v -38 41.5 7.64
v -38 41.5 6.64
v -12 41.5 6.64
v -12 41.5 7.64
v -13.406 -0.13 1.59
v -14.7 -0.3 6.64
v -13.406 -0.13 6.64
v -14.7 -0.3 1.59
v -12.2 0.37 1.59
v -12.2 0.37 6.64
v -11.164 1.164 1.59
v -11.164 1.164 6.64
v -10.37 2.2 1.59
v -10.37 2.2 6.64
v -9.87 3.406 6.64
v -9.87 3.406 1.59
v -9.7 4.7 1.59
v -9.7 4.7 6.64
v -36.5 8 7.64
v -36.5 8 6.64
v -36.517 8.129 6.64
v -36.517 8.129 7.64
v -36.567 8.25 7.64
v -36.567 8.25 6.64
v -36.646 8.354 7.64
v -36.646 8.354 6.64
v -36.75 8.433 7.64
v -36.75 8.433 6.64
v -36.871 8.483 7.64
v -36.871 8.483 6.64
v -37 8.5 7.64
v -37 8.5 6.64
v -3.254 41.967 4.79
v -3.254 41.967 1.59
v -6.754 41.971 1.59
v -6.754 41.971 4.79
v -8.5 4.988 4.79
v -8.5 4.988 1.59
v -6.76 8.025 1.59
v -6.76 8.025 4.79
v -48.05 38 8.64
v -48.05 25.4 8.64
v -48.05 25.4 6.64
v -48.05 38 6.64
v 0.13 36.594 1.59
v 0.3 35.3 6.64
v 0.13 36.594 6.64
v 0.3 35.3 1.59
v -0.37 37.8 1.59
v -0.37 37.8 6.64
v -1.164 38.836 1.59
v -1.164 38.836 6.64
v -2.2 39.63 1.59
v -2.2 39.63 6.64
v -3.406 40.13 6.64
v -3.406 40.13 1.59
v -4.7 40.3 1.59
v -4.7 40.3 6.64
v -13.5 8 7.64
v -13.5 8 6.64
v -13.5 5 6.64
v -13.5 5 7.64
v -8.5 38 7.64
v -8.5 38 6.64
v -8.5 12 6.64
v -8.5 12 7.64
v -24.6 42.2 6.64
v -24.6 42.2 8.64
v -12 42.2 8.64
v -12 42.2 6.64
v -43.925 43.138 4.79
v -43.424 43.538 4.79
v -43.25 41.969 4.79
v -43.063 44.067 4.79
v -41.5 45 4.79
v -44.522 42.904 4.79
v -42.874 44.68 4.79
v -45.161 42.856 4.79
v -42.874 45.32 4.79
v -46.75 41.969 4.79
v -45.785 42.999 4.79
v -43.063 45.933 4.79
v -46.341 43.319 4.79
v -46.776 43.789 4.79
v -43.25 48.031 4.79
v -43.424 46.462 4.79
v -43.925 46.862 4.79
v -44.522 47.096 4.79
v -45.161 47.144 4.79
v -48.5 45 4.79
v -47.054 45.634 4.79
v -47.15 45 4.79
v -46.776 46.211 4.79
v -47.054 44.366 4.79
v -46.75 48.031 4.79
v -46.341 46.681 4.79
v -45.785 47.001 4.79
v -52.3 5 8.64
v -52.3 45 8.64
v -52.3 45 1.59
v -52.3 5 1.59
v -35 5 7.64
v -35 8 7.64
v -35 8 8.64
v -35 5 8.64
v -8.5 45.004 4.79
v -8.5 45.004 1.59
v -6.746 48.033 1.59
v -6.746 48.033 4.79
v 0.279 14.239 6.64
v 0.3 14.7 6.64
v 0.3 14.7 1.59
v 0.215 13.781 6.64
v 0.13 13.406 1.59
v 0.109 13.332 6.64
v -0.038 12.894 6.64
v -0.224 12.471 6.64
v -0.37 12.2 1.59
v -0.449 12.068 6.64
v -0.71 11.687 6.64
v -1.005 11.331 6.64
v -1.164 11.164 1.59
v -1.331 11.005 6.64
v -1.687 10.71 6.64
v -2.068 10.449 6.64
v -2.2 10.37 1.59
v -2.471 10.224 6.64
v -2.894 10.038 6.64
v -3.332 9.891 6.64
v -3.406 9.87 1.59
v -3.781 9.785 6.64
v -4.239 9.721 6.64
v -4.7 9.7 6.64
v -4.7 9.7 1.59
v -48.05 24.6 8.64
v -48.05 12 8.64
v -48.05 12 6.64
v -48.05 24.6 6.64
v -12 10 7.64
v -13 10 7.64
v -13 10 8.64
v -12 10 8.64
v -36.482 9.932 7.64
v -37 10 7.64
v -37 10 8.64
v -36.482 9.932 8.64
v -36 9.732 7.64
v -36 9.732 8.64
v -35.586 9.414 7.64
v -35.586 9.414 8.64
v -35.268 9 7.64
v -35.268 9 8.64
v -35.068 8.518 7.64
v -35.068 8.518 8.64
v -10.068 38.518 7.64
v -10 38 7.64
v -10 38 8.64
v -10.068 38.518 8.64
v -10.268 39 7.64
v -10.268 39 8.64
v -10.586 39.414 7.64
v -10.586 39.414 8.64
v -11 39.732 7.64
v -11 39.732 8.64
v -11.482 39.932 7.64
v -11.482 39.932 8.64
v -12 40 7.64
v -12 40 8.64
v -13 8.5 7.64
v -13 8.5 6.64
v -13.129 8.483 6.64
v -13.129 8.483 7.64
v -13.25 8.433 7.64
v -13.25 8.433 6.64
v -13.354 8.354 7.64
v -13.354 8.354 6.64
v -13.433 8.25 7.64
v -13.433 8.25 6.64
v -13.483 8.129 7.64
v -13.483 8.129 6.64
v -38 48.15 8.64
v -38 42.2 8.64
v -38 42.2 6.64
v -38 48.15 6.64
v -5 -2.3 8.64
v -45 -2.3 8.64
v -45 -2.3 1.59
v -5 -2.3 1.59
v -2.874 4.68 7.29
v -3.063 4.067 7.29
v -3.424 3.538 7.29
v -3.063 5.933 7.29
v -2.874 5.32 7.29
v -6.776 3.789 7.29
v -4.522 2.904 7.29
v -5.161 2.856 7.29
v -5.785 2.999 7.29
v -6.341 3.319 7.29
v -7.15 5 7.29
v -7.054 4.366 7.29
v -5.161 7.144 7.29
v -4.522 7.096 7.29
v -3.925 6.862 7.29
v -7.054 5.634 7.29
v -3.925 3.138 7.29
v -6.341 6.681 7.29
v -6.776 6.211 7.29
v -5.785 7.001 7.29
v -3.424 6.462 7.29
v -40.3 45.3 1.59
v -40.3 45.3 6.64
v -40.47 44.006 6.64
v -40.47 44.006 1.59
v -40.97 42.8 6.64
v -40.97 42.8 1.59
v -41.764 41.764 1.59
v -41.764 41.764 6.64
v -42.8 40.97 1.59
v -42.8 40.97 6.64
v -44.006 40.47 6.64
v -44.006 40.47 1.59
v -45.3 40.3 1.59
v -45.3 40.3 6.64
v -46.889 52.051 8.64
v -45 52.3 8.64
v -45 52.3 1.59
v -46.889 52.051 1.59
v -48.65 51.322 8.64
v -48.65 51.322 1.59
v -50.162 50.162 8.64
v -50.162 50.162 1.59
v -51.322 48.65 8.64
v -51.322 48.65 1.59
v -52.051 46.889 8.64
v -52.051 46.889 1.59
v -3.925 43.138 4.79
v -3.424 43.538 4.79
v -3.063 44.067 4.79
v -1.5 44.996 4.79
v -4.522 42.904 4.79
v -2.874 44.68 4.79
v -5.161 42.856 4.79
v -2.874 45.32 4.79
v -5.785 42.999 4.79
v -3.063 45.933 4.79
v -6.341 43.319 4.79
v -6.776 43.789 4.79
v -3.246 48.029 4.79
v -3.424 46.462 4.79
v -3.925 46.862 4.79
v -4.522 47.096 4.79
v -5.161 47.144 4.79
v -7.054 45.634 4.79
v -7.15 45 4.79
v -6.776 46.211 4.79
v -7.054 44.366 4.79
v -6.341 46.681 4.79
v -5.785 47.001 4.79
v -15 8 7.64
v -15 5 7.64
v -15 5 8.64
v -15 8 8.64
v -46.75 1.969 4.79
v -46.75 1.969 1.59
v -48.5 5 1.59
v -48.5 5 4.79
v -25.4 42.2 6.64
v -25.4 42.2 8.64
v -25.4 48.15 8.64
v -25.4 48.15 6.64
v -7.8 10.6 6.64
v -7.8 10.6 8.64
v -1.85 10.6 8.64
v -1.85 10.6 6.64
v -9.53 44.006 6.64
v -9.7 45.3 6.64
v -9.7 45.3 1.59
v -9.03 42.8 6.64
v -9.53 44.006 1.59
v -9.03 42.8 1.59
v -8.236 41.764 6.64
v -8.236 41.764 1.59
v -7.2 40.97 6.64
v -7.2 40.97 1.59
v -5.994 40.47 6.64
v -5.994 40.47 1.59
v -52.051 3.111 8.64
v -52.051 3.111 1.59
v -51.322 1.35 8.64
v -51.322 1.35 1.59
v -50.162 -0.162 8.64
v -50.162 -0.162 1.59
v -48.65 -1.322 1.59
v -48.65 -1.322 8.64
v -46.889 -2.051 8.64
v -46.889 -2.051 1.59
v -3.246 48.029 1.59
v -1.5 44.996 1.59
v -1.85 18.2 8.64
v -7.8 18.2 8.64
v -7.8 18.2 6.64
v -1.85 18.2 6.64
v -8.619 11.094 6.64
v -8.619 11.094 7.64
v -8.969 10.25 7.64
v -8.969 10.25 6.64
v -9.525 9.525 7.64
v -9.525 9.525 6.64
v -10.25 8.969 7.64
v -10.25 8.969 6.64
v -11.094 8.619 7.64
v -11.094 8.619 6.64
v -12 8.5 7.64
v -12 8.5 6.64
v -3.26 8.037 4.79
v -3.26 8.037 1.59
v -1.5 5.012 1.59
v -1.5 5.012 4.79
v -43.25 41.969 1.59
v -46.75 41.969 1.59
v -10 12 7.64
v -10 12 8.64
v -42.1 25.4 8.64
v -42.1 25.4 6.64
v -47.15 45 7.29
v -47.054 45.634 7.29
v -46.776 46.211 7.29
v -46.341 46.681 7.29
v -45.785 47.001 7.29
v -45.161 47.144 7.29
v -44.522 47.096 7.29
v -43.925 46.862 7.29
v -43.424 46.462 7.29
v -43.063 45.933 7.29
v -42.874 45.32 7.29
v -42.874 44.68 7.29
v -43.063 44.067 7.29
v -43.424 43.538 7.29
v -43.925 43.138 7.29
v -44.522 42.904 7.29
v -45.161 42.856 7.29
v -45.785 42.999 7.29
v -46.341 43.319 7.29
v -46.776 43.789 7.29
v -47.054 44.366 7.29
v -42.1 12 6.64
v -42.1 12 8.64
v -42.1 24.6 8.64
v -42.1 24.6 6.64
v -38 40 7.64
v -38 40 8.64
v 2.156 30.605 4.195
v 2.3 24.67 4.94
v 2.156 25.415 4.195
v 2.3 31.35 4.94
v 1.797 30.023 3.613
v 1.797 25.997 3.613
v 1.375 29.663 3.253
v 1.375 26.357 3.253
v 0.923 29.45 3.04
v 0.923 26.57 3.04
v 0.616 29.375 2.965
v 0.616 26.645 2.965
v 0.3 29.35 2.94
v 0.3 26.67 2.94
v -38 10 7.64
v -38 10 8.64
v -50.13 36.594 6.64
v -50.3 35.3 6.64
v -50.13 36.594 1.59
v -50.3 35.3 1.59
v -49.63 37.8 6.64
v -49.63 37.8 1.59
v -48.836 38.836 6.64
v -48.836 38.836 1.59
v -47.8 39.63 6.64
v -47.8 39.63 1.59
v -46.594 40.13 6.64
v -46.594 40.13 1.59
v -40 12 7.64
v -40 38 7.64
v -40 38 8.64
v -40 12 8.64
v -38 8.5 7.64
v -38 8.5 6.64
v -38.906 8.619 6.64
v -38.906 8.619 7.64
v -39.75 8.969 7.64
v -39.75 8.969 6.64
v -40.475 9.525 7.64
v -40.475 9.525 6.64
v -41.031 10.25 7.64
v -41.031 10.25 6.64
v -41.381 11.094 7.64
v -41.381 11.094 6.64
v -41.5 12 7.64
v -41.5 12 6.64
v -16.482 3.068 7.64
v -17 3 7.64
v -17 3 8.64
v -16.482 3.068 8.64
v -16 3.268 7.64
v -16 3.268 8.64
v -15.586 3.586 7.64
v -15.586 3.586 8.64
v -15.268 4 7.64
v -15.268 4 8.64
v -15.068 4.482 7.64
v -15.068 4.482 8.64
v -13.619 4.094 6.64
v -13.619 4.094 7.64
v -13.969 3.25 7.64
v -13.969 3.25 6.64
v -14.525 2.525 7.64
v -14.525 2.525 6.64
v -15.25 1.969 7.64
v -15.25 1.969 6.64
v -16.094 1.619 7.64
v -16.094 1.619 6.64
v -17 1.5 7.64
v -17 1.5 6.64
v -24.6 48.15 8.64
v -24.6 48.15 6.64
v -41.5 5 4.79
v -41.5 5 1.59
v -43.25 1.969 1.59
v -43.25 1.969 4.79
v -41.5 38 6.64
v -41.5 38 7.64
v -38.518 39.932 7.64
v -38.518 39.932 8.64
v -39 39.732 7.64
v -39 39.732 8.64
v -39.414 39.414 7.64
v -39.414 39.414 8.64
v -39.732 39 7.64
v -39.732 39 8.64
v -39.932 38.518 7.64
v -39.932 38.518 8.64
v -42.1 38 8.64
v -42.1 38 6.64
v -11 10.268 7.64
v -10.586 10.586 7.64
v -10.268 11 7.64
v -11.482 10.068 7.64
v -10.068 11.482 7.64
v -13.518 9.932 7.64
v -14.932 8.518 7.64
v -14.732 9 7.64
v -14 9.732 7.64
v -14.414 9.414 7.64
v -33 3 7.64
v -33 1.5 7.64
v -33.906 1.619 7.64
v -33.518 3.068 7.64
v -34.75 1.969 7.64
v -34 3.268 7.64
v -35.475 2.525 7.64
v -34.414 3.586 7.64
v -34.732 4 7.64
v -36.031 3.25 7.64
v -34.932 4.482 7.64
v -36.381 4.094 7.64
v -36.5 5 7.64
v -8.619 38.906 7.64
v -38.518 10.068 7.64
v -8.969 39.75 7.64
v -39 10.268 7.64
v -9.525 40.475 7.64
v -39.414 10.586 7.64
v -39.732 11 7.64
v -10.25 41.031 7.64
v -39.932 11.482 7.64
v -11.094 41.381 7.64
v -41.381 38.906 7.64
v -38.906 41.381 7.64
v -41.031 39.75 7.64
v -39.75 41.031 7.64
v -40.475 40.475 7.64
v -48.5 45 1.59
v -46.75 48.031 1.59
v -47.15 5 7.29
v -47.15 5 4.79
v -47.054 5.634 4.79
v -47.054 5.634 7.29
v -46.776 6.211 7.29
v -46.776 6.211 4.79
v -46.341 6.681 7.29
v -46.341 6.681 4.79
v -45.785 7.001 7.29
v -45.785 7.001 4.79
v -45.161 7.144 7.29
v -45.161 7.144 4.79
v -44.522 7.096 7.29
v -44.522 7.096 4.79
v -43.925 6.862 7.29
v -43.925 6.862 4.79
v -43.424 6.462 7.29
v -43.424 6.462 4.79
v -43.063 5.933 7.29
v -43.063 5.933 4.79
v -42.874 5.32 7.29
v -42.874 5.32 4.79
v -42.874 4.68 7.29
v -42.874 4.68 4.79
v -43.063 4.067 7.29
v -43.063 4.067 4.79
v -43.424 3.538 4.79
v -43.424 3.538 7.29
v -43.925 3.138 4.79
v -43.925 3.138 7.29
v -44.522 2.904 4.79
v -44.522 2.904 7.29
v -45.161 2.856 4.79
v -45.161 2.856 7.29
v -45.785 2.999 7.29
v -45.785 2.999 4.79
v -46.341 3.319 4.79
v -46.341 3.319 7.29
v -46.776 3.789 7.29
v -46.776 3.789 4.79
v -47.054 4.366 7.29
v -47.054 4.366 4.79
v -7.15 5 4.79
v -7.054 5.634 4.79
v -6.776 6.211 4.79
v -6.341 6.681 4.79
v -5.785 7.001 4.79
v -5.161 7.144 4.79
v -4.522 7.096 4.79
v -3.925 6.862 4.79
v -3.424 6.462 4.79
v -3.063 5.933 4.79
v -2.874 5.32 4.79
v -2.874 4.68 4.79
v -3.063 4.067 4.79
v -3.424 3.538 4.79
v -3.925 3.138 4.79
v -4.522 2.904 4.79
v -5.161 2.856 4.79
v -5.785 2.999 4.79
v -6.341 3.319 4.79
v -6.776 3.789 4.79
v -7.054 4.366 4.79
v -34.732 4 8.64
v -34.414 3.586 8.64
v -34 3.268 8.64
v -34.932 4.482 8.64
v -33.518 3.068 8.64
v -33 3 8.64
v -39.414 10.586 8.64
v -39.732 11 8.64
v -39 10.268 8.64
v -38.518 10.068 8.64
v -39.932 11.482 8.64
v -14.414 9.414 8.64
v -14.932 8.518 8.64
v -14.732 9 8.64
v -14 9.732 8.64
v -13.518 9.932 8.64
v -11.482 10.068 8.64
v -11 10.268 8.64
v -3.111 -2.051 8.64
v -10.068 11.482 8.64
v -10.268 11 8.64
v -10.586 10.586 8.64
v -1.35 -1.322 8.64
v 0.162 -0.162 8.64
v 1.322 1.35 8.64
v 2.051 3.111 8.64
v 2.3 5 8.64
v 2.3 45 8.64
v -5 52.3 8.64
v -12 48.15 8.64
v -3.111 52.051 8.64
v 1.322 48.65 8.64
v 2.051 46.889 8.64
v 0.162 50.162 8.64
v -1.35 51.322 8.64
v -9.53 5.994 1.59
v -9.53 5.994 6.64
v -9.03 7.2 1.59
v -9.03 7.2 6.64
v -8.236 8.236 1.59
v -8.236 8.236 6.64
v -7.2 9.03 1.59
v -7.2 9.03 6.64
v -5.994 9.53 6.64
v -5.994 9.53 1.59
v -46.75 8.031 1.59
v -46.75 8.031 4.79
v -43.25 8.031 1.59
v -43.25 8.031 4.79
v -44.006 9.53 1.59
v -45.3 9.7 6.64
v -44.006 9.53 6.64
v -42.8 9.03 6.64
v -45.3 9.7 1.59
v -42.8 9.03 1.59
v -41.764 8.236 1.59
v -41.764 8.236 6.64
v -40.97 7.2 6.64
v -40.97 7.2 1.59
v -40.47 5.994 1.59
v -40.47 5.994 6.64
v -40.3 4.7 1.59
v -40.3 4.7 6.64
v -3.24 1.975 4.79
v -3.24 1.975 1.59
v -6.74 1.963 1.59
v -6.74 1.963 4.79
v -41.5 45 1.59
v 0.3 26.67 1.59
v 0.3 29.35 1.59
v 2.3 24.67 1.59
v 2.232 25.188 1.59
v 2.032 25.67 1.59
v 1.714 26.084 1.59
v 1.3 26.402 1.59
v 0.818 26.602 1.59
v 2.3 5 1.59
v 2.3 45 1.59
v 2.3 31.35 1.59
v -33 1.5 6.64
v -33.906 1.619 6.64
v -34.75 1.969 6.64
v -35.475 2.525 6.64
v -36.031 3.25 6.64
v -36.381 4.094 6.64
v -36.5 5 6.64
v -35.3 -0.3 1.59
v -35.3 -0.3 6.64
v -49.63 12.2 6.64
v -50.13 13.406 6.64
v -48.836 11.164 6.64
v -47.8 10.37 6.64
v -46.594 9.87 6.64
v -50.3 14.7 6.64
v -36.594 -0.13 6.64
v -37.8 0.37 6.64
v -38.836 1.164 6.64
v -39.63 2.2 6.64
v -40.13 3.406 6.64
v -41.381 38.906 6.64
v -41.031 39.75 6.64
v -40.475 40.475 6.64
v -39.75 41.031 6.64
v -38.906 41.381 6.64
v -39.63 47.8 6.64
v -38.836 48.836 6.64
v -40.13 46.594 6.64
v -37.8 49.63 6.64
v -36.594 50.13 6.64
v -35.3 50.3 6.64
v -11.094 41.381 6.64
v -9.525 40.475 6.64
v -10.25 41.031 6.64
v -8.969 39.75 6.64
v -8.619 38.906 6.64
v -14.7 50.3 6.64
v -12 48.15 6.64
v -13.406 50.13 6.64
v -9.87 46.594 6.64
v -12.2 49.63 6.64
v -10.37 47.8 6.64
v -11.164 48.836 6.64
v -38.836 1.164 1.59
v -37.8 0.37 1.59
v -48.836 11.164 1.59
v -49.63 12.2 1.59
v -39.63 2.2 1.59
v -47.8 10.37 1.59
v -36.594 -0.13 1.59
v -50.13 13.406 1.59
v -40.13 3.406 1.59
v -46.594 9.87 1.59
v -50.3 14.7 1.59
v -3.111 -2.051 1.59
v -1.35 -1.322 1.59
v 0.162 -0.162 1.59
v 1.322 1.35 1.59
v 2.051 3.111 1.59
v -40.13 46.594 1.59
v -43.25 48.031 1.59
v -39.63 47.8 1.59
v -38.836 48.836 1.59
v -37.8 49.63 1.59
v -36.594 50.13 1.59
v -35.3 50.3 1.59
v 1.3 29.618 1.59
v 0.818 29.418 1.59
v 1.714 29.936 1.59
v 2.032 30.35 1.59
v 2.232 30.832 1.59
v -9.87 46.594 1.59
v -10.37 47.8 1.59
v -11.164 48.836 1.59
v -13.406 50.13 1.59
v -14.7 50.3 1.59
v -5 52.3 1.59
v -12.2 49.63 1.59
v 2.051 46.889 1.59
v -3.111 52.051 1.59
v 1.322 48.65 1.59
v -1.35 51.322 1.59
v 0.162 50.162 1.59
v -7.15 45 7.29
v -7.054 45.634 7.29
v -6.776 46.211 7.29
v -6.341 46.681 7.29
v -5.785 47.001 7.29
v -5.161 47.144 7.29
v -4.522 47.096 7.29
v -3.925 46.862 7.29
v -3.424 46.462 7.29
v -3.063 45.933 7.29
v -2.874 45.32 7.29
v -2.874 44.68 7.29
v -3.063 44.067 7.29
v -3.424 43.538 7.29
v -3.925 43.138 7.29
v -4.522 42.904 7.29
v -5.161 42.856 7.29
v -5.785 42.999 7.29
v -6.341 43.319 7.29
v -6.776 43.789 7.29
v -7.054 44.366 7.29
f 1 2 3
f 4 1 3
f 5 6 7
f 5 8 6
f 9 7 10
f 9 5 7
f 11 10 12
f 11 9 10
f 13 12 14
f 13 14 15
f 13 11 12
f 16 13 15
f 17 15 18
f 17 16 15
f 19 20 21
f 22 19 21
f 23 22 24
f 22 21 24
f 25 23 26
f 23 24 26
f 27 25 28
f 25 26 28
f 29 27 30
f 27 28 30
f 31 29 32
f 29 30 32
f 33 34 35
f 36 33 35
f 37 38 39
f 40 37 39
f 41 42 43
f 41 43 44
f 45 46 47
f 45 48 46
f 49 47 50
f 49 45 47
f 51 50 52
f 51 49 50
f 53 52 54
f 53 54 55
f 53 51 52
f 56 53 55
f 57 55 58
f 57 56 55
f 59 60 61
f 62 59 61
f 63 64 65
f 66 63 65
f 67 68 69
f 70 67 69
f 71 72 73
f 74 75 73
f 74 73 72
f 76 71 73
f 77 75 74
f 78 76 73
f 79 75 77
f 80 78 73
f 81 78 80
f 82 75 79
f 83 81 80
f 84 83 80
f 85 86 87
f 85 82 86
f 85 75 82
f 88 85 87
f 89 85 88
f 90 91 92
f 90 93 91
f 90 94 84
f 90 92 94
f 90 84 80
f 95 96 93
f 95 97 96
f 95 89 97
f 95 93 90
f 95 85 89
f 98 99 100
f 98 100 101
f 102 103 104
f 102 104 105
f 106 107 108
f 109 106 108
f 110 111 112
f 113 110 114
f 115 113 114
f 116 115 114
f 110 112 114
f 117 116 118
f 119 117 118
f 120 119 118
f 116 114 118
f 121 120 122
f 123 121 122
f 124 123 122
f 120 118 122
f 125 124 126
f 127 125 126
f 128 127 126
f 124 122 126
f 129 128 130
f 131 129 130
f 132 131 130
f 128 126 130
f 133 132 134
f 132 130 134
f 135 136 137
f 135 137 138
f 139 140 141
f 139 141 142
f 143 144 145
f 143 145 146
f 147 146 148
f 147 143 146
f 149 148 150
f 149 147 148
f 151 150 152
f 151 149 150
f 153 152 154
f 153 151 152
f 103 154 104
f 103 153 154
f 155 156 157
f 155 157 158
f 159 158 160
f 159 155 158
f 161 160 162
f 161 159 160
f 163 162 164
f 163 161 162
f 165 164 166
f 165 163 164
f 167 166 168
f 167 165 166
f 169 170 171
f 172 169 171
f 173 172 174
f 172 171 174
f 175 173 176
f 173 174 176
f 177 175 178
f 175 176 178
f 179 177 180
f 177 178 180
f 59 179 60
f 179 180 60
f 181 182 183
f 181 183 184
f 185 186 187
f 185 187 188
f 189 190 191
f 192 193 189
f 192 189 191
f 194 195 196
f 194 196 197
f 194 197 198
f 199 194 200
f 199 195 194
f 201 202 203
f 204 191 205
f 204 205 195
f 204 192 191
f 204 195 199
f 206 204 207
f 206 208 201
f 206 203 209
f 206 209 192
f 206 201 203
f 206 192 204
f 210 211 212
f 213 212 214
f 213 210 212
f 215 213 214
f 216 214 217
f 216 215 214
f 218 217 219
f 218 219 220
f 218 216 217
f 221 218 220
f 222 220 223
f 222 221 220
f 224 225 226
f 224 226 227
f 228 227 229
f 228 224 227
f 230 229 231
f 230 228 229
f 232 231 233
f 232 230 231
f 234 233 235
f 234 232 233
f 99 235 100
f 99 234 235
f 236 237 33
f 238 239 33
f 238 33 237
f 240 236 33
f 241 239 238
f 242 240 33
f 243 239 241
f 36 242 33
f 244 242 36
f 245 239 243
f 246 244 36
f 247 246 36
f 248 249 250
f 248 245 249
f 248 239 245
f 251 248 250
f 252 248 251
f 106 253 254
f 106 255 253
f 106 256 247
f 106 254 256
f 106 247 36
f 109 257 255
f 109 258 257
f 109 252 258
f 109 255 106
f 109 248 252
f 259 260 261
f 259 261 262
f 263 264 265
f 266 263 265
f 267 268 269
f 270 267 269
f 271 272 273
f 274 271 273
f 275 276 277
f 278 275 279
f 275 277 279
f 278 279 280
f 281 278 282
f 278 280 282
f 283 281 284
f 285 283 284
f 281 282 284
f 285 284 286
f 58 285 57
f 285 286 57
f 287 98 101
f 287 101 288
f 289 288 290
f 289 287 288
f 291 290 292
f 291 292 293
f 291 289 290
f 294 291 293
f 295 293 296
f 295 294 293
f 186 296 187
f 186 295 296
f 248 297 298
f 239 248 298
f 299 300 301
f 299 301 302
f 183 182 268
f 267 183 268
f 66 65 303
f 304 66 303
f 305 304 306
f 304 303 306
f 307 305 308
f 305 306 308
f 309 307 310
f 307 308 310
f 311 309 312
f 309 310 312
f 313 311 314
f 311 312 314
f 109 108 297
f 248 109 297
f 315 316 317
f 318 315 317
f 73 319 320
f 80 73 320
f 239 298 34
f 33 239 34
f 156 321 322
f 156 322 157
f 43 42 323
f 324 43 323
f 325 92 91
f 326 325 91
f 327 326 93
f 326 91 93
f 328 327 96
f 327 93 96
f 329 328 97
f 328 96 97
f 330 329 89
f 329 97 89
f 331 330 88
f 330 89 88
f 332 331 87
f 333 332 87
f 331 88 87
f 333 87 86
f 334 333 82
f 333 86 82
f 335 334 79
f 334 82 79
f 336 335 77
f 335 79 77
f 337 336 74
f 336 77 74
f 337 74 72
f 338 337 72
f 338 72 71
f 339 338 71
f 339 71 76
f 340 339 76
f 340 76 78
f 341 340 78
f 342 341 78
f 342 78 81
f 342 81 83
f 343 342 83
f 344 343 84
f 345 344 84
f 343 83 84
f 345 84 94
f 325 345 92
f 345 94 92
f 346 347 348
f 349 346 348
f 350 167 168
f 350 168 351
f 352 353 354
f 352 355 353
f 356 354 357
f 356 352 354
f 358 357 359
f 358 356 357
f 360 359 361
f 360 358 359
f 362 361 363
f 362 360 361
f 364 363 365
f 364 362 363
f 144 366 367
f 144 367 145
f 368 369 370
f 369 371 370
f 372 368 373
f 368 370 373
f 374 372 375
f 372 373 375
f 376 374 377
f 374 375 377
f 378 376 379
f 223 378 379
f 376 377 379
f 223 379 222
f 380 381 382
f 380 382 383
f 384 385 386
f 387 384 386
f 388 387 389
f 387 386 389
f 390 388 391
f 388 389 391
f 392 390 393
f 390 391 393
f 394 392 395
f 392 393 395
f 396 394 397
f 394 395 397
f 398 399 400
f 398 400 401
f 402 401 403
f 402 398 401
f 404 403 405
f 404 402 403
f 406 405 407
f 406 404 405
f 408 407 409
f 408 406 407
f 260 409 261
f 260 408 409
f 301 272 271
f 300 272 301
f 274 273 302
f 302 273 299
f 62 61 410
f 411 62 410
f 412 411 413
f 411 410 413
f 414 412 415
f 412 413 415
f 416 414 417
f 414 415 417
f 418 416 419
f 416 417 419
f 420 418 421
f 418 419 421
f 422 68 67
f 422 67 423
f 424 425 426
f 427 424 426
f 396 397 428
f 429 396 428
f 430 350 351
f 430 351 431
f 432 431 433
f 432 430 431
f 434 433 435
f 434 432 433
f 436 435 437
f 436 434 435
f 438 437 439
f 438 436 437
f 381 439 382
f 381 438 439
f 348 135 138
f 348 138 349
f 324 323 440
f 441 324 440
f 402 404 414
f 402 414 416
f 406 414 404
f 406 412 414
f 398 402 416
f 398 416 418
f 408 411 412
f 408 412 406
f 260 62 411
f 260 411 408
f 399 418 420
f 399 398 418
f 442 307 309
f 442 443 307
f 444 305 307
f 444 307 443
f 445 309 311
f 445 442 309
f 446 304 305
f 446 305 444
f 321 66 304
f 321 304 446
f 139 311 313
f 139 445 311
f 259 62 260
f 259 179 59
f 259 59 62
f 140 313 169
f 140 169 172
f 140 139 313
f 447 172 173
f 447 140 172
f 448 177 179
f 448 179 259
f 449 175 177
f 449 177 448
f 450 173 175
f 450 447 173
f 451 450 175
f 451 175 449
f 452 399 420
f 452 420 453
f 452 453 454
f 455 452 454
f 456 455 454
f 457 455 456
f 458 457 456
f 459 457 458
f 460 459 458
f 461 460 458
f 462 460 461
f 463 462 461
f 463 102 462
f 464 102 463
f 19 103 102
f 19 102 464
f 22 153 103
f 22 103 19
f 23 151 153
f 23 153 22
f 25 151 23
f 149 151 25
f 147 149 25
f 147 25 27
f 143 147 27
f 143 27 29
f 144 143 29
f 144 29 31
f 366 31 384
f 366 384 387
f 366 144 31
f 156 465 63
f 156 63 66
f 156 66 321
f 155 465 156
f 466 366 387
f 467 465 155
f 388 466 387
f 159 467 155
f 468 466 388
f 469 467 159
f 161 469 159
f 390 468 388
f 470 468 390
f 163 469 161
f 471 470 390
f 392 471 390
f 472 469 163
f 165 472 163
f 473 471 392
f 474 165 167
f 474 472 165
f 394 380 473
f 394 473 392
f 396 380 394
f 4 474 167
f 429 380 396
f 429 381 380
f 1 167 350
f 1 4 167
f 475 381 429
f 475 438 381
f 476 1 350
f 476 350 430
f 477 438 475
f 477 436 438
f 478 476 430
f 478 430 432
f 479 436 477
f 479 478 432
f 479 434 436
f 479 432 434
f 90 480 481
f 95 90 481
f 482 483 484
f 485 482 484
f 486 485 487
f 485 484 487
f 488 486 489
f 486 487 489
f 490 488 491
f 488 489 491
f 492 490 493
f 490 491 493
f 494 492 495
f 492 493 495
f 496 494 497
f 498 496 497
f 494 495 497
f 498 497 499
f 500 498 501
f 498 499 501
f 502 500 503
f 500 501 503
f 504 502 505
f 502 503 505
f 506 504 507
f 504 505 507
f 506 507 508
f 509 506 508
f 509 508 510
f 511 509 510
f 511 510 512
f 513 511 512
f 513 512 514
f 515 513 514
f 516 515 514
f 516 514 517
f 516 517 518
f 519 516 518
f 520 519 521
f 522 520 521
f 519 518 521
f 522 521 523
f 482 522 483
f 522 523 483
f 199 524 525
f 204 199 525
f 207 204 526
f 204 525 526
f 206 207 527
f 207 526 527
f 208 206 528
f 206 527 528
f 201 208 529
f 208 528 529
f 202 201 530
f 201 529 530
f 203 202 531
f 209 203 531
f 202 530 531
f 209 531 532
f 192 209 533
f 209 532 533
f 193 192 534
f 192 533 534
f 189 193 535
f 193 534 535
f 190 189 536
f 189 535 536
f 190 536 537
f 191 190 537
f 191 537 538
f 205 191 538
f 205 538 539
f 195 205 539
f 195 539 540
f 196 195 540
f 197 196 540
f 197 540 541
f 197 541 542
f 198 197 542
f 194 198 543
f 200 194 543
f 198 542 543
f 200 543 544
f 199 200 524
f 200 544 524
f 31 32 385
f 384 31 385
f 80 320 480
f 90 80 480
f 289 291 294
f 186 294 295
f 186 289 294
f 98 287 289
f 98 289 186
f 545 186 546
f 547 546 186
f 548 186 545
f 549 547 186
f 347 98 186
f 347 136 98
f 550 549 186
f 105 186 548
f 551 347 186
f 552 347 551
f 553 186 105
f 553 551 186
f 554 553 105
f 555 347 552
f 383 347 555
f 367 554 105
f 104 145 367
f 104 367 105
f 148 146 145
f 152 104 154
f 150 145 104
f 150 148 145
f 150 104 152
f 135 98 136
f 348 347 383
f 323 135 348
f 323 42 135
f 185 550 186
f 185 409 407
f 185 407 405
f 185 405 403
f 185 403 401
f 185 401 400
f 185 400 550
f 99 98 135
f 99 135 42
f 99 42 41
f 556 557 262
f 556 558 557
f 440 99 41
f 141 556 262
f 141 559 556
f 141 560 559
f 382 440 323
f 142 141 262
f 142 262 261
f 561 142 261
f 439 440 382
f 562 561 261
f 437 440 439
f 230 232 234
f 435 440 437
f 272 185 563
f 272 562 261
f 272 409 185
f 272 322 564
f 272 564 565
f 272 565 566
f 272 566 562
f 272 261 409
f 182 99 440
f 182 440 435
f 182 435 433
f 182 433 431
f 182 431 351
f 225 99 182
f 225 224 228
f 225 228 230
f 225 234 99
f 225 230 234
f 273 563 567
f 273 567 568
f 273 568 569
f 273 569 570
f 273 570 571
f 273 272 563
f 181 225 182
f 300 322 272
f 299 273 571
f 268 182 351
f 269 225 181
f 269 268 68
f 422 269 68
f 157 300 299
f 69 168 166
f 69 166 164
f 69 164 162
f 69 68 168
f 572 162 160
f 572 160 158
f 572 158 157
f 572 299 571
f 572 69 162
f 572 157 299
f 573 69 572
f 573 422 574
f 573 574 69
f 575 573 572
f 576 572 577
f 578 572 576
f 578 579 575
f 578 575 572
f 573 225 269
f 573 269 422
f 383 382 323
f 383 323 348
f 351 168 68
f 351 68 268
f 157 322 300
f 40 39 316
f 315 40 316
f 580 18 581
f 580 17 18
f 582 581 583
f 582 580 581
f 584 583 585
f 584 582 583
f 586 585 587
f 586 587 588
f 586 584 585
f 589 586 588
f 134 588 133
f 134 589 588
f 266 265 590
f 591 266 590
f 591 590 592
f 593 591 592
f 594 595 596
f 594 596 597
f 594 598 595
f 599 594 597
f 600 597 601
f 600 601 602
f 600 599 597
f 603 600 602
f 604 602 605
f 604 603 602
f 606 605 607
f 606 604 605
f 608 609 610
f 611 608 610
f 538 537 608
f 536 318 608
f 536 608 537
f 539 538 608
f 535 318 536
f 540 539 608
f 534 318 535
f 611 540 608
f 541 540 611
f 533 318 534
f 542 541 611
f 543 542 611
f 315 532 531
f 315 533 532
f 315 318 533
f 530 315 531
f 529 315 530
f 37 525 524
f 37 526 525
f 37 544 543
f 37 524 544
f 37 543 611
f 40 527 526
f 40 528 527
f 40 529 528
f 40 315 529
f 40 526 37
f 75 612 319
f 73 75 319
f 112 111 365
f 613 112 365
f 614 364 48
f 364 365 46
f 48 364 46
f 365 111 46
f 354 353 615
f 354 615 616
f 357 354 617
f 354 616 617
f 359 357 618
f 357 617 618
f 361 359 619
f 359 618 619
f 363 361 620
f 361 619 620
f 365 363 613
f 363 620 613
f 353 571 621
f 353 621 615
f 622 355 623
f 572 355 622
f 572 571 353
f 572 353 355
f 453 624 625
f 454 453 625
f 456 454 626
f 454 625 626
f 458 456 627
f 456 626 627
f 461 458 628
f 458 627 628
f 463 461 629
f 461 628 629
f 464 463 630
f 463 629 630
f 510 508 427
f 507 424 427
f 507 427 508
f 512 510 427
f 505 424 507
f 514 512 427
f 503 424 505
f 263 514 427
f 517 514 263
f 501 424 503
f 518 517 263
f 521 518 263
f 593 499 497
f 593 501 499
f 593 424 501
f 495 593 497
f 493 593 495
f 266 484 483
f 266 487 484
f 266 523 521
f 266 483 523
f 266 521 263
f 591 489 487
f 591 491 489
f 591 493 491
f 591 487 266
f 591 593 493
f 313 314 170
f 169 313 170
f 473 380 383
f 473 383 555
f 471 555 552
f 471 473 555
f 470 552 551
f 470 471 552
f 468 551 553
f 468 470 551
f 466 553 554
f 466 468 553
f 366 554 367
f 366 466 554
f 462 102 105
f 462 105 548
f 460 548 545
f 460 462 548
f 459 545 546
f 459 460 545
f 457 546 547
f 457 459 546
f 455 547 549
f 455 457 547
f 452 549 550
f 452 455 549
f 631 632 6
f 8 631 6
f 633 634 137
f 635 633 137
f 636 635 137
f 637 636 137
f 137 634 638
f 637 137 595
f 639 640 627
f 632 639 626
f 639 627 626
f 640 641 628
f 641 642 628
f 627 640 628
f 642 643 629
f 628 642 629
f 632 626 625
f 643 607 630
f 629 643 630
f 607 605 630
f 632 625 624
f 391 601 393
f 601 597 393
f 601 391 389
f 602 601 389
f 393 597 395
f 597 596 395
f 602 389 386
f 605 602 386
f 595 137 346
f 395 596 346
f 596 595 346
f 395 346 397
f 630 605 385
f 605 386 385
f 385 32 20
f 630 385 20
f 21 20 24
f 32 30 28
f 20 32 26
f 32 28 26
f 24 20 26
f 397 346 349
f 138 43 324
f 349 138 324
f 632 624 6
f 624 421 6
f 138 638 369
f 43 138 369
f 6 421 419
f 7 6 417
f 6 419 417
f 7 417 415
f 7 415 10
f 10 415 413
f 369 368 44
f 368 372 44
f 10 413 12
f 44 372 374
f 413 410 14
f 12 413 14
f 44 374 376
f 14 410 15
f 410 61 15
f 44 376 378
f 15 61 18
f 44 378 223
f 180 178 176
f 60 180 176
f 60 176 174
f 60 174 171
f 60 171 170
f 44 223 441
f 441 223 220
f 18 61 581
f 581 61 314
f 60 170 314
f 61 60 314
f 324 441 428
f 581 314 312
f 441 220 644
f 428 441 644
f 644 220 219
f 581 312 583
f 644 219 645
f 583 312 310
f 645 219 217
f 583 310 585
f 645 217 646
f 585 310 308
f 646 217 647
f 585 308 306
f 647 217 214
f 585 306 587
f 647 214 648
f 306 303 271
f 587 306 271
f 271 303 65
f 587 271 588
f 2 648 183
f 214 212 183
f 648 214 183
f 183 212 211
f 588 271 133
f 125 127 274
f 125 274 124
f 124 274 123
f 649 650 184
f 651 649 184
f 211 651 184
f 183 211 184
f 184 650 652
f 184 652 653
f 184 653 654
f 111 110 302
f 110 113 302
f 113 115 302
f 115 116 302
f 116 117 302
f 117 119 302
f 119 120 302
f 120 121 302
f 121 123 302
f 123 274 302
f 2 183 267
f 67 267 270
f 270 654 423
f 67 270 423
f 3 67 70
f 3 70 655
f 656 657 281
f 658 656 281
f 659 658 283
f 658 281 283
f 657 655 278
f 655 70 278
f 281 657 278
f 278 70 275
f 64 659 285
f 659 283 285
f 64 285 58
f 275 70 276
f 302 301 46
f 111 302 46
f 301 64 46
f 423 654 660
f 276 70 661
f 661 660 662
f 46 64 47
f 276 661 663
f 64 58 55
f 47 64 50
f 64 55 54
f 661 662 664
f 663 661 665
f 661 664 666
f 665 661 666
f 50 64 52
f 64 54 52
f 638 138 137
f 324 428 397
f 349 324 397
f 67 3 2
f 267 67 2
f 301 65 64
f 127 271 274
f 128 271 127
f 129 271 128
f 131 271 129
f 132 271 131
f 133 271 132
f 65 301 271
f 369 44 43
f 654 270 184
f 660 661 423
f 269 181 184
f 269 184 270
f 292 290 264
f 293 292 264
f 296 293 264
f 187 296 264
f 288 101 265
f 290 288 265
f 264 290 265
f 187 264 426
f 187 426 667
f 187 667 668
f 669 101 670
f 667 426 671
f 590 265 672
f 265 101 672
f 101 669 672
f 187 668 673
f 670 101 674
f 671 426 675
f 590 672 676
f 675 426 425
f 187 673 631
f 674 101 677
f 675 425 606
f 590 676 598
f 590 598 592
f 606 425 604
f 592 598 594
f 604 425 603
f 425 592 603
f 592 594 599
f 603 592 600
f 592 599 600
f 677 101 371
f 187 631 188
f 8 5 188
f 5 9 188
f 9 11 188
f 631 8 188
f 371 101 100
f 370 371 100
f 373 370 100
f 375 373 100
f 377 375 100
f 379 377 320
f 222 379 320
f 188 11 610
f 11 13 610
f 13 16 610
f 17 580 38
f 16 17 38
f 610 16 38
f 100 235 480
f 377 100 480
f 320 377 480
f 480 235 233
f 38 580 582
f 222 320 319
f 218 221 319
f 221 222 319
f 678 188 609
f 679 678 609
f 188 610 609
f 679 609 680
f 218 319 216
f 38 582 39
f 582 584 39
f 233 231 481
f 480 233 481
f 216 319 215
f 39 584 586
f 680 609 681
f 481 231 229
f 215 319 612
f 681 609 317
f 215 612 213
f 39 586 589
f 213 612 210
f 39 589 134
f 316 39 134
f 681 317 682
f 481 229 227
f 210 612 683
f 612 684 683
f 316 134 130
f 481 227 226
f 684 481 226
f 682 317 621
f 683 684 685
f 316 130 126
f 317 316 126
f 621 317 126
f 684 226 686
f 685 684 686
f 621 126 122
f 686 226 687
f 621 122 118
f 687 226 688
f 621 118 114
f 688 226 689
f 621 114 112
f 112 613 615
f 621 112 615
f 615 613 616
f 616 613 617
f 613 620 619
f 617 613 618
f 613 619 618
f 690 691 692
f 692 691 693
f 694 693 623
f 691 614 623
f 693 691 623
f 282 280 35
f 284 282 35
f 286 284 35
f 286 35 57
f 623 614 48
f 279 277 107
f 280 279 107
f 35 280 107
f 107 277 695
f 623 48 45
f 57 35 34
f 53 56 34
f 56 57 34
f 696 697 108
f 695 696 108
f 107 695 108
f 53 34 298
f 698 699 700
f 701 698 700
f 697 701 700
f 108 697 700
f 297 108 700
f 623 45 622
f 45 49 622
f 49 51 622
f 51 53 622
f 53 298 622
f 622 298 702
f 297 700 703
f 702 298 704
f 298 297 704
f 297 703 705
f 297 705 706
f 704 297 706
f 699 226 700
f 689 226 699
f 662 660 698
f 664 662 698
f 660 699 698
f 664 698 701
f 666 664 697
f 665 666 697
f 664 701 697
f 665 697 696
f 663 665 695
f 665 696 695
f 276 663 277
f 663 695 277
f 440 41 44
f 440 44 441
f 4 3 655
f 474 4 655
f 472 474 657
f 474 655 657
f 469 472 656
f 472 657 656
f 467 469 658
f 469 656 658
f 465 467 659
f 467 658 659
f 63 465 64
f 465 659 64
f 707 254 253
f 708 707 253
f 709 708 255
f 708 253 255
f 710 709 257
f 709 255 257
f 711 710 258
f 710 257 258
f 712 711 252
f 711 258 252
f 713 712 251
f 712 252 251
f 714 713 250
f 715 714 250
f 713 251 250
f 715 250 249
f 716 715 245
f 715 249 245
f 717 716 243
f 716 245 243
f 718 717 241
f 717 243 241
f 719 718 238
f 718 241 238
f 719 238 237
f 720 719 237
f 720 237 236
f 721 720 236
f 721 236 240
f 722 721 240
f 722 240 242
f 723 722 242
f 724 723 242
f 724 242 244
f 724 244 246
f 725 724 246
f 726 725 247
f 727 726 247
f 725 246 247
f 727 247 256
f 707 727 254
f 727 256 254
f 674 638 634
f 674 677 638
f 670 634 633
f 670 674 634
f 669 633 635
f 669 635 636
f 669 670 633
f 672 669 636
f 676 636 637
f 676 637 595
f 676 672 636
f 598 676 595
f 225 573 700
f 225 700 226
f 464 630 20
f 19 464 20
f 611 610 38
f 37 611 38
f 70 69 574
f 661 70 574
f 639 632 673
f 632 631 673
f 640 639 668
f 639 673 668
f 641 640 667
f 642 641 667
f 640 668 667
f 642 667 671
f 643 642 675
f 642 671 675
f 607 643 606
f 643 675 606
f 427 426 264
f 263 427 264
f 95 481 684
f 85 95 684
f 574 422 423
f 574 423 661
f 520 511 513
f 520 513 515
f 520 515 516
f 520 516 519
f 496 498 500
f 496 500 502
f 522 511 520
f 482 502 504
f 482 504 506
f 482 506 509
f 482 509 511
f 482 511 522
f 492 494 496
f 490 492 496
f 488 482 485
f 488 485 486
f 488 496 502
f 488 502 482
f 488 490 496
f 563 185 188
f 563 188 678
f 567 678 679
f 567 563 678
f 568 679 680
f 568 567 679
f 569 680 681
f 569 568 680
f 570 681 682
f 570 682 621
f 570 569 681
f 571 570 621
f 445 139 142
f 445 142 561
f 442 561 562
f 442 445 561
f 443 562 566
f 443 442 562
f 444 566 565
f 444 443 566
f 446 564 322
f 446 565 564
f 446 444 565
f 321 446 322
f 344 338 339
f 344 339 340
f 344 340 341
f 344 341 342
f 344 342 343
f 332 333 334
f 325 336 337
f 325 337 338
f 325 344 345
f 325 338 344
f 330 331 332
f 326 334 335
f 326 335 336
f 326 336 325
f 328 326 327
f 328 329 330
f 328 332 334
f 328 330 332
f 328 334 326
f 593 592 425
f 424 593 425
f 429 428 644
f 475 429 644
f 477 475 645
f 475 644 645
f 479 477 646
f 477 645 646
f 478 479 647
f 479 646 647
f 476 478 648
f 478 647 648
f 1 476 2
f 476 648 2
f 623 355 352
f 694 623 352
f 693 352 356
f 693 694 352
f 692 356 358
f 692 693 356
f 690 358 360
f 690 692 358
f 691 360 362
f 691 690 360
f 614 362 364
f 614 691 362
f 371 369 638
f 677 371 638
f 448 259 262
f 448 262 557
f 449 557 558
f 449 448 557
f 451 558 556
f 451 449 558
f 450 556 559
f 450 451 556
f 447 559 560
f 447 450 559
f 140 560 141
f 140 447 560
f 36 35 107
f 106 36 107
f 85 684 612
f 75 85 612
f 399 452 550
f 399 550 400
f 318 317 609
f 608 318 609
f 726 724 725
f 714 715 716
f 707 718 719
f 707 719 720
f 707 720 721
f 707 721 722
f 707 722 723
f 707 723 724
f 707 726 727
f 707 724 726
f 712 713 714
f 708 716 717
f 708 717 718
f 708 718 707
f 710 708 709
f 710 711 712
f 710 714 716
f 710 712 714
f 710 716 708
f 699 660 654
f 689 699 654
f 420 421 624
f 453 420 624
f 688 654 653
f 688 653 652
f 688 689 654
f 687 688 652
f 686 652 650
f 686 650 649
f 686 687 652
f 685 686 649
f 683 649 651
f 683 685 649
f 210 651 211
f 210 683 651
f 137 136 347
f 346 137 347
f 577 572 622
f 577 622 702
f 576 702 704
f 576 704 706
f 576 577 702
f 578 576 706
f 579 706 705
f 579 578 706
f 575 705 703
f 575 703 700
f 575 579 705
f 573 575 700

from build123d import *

# Parameters (mm, degrees)
WALL_EXTRUDE_BOSS_START          = 8.64
WALL_EXTRUDE_BOSS_DEPTH          = 7.05
CEILING_EXTRUDE_BOSS_DEPTH       = 2
SCREWS_BLOCKS_EXTRUDE_BOSS_DEPTH = 5.05
SCREWS_BLOCKS_FILLET_R           = 5
NUTS_EXTRUDE_DEPTH               = 3.2
SCREWS_SKETCH_R                  = 2.15
SCREWS_HOOLES_EXTRUDE_DEPTH      = 2.5
CONNECTORS_SKETCH_W              = 12.6
CONNECTORS_SKETCH_H              = 5.95
CONNECTORS_SKETCH_W_2            = 5.95
CONNECTORS_SKETCH_H_2            = 12.6
CONNECTORS_SKETCH_H_3            = 7.6
CONNECTORS_EXTRUDE_DEPTH         = 2.5
SWITCH_SKETCH_W                  = 1.4
SWITCH_SKETCH_H                  = 2.68
SWITCH_EXTRUDE_DEPTH             = 2.5
SWITCH_FILLET_R                  = 2
GLASS_EXTRUDE_DEPTH              = 2.5
GLASS_FIT_EXTRUDE_DEPTH          = 1


with BuildPart() as part:
    # Wall_Sketch → Wall_Extrude_Boss (new body)
    with BuildSketch(Plane.XY.offset(WALL_EXTRUDE_BOSS_START)):
        with BuildLine():
            Line((-52.3, 44.999999897), (-52.29999, 5.00000605))
            ThreePointArc((-52.29999, 5.00000605), (-50.161874571, -0.161870293), (-45, -2.29999))
            Line((-45, -2.29999), (-5.000000575, -2.3))
            ThreePointArc((-5.000000575, -2.3), (0.161879299, -0.161879706), (2.3, 5))
            Line((2.3, 5), (2.3, 45))
            ThreePointArc((2.3, 45), (0.161879503, 50.161879503), (-5, 52.3))
            Line((-5, 52.3), (-45, 52.3))
            ThreePointArc((-45, 52.3), (-50.161879539, 50.161879466), (-52.3, 44.999999897))
        make_face()
        with BuildLine():
            Line((-5, 50.3), (-45, 50.3))
            ThreePointArc((-45, 50.3), (-48.747665967, 48.747665914), (-50.3, 44.999999925))
            Line((-50.3, 44.999999925), (-50.29999, 5.00000655))
            ThreePointArc((-50.29999, 5.00000655), (-48.747661185, 1.252343447), (-45, -0.29999))
            Line((-45, -0.29999), (-5.000000075, -0.3))
            ThreePointArc((-5.000000075, -0.3), (-1.252334086, 1.252334033), (0.3, 5))
            Line((0.3, 5), (0.3, 45))
            ThreePointArc((0.3, 45), (-1.25233406, 48.74766594), (-5, 50.3))
        make_face(mode=Mode.SUBTRACT)
    extrude(amount=-WALL_EXTRUDE_BOSS_DEPTH)

    # Ceiling_Sketch → Ceiling_Extrude_Boss (add)
    with BuildSketch(Plane.XY.offset(8.64)):
        with BuildLine():
            Line((-45, -0.29999), (-5.000000075, -0.3))
            ThreePointArc((-5.000000075, -0.3), (-1.252334086, 1.252334033), (0.3, 5))
            Line((0.3, 5), (0.3, 45))
            ThreePointArc((0.3, 45), (-1.25233406, 48.74766594), (-5, 50.3))
            Line((-5, 50.3), (-45, 50.3))
            ThreePointArc((-45, 50.3), (-48.747665967, 48.747665914), (-50.3, 44.999999925))
            Line((-50.3, 44.999999925), (-50.29999, 5.00000655))
            ThreePointArc((-50.29999, 5.00000655), (-48.747661185, 1.252343447), (-45, -0.29999))
        make_face()
    extrude(amount=-CEILING_EXTRUDE_BOSS_DEPTH)


with BuildPart() as screws_blocks_extrude_boss_tool:
    # Screws_Blocks_Sketch → Screws_Blocks_Extrude_Boss (new body)
    with BuildSketch(Plane(origin=(0, 0, 6.64), x_dir=(-1, 0, 0), z_dir=(0, 0, -1))):
        with BuildLine():
            Line((9.7, -0.299998825), (4.7, -0.299998825))
            ThreePointArc((4.7, -0.299998825), (1.164466094, 1.164467269), (-0.3, 4.700001175))
            Line((-0.3, 4.700001175), (-0.3, 9.700001175))
            Line((-0.3, 9.700001175), (9.7, 9.700001175))
            Line((9.7, 9.700001175), (9.7, -0.299998825))
        make_face()
        with BuildLine():
            Line((9.7, 50.3), (4.7, 50.3))
            ThreePointArc((4.7, 50.3), (1.164466094, 48.835533906), (-0.3, 45.3))
            Line((-0.3, 45.3), (-0.3, 40.3))
            Line((-0.3, 40.3), (9.7, 40.3))
            Line((9.7, 40.3), (9.7, 50.3))
        make_face()
        with BuildLine():
            Line((40.299998825, 50.3), (45.299998825, 50.3))
            ThreePointArc((45.299998825, 50.3), (48.835532731, 48.835533906), (50.299998825, 45.3))
            Line((50.299998825, 45.3), (50.299998825, 40.3))
            Line((50.299998825, 40.3), (40.299998825, 40.3))
            Line((40.299998825, 40.3), (40.299998825, 50.3))
        make_face()
        with BuildLine():
            Line((40.299991175, -0.299991175), (45.299991175, -0.299991175))
            ThreePointArc((45.299991175, -0.299991175), (48.835525081, 1.164474919), (50.299991175, 4.700008825))
            Line((50.299991175, 4.700008825), (50.299991175, 9.700008825))
            Line((50.299991175, 9.700008825), (40.299991175, 9.700008825))
            Line((40.299991175, 9.700008825), (40.299991175, -0.299991175))
        make_face()
    extrude(amount=SCREWS_BLOCKS_EXTRUDE_BOSS_DEPTH)


with BuildPart() as part_1:
    add(part.part)


with BuildPart() as part_2:
    # Screws_Blocks_Extrude_Boss: joined with screws_blocks_extrude_boss_tool
    add(part_1.part.fuse(screws_blocks_extrude_boss_tool.part, tol=0.00001))

    # Screws_Blocks_Fillet
    screws_blocks_fillet_edges = [part_2.edges().sort_by_distance(p)[0] for p in [
        (-40.299998825, 50.3, 4.115),
        (-50.299998825, 40.3, 4.115),
        (-40.299998825, 40.3, 4.115),
        (-9.7, 50.3, 4.115),
        (-9.7, 40.3, 4.115),
        (0.3, 40.3, 4.115),
        (0.3, 9.700001175, 4.115),
        (-9.7, 9.700001175, 4.115),
        (-9.7, -0.299998825, 4.115),
        (-40.299991175, -0.299991175, 4.115),
        (-40.299991175, 9.700008825, 4.115),
        (-50.299991175, 9.700008825, 4.115),
    ]]
    fillet(screws_blocks_fillet_edges, radius=SCREWS_BLOCKS_FILLET_R - 0.0001)  # a hair under: the kernel refuses the full size

    # Nuts_Sketch → Nuts_Extrude (cut)
    with BuildSketch(Plane(origin=(0, 0, 1.59), x_dir=(-1, 0, 0), z_dir=(0, 0, -1))):
        Polygon((1.500002453, 44.995856332), (3.253589748, 41.966841377), (6.753587296, 41.970985045), (8.499997547, 45.004143668), (6.746410252, 48.033158623), (3.246412704, 48.029014955), align=None)
        Polygon((41.5, 45), (43.25, 41.968911087), (46.75, 41.968911087), (48.5, 45), (46.75, 48.031088913), (43.25, 48.031088913), align=None)
        Polygon((41.5, 5), (43.25, 1.968911087), (46.75, 1.968911087), (48.5, 5), (46.75, 8.031088913), (43.25, 8.031088913), align=None)
        Polygon((8.49998026, 4.988245077), (6.760170192, 8.025194356), (3.260189932, 8.03694928), (1.50001974, 5.011754923), (3.239829808, 1.974805644), (6.739810068, 1.96305072), align=None)
    extrude(amount=-NUTS_EXTRUDE_DEPTH, mode=Mode.SUBTRACT)

    # Screws_Sketch → Screws_Hooles_Extrude (cut)
    with BuildSketch(Plane(origin=(0, 0, 4.79), x_dir=(-1, 0, 0), z_dir=(0, 0, -1))):
        with Locations((5, 45)):
            Circle(SCREWS_SKETCH_R)
        with Locations((45, 45)):
            Circle(SCREWS_SKETCH_R)
        with Locations((45, 5)):
            Circle(SCREWS_SKETCH_R)
        with Locations((5, 5)):
            Circle(SCREWS_SKETCH_R)
    extrude(amount=-SCREWS_HOOLES_EXTRUDE_DEPTH, mode=Mode.SUBTRACT)

    # Connectors_Sketch → Connectors_Extrude (cut)
    with BuildSketch(Plane.XY.offset(8.64)):
        with Locations((-31.7, 45.175)):
            Rectangle(CONNECTORS_SKETCH_W, CONNECTORS_SKETCH_H)
        with Locations((-18.3, 45.175)):
            Rectangle(CONNECTORS_SKETCH_W, CONNECTORS_SKETCH_H)
        with Locations((-45.075, 31.7)):
            Rectangle(CONNECTORS_SKETCH_W_2, CONNECTORS_SKETCH_H_2)
        with Locations((-45.075, 18.3)):
            Rectangle(CONNECTORS_SKETCH_W_2, CONNECTORS_SKETCH_H_2)
        with Locations((-4.825, 14.4)):
            Rectangle(CONNECTORS_SKETCH_W_2, CONNECTORS_SKETCH_H_3)
    extrude(amount=-CONNECTORS_EXTRUDE_DEPTH, mode=Mode.SUBTRACT)

    # Switch_Sketch → Switch_Extrude (cut)
    with BuildSketch(Plane(origin=(2.3, 0, 0), x_dir=(0, 0, -1), z_dir=(1, 0, 0))):
        with Locations((-2.24, 28.01)):
            Rectangle(SWITCH_SKETCH_W, SWITCH_SKETCH_H)
    extrude(amount=-SWITCH_EXTRUDE_DEPTH, mode=Mode.SUBTRACT)

    # Switch_Fillet
    switch_fillet_edges = [part_2.edges().sort_by_distance(p)[0] for p in [
        (2.3, 28.01, 2.94),
        (2.3, 29.35, 2.265),
        (2.3, 26.67, 2.265),
    ]]
    fillet(switch_fillet_edges, radius=SWITCH_FILLET_R - 0.0001)  # a hair under: the kernel refuses the full size

    # Glass_Sketch → Glass_Extrude (cut)
    with BuildSketch(Plane(origin=(0, 0, 6.64), x_dir=(-1, 0, 0), z_dir=(0, 0, -1))):
        with BuildLine():
            Line((34.9999975, 8), (34.9999975, 5))
            ThreePointArc((34.9999975, 5), (34.414211062, 3.585786438), (32.9999975, 3))
            Line((32.9999975, 3), (16.9999975, 3))
            ThreePointArc((16.9999975, 3), (15.585783938, 3.585786438), (14.9999975, 5))
            Line((14.9999975, 5), (14.9999975, 8))
            ThreePointArc((14.9999975, 8), (14.414211062, 9.414213562), (12.9999975, 10))
            Line((12.9999975, 10), (11.9999975, 10))
            ThreePointArc((11.9999975, 10), (10.585783938, 10.585786438), (9.9999975, 12))
            Line((9.9999975, 12), (9.9999975, 38))
            ThreePointArc((9.9999975, 38), (10.585783938, 39.414213562), (11.9999975, 40))
            Line((11.9999975, 40), (37.9999975, 40))
            ThreePointArc((37.9999975, 40), (39.414211062, 39.414213562), (39.9999975, 38))
            Line((39.9999975, 38), (39.9999975, 12))
            ThreePointArc((39.9999975, 12), (39.414211062, 10.585786438), (37.9999975, 10))
            Line((37.9999975, 10), (36.9999975, 10))
            ThreePointArc((36.9999975, 10), (35.585783938, 9.414213562), (34.9999975, 8))
        make_face()
    extrude(amount=-GLASS_EXTRUDE_DEPTH, mode=Mode.SUBTRACT)

    # Glass_Fit_Sketch → Glass_Fit_Extrude (cut)
    with BuildSketch(Plane(origin=(0, 0, 6.64), x_dir=(-1, 0, 0), z_dir=(0, 0, -1))):
        with BuildLine():
            Line((36.9999975, 8.5), (37.9999975, 8.5))
            ThreePointArc((37.9999975, 8.5), (40.474871234, 9.525126266), (41.4999975, 12))
            Line((41.4999975, 12), (41.4999975, 38))
            ThreePointArc((41.4999975, 38), (40.474871234, 40.474873734), (37.9999975, 41.5))
            Line((37.9999975, 41.5), (11.9999975, 41.5))
            ThreePointArc((11.9999975, 41.5), (9.525123766, 40.474873734), (8.4999975, 38))
            Line((8.4999975, 38), (8.4999975, 12))
            ThreePointArc((8.4999975, 12), (9.525123766, 9.525126266), (11.9999975, 8.5))
            Line((11.9999975, 8.5), (12.9999975, 8.5))
            ThreePointArc((12.9999975, 8.5), (13.353550891, 8.353553391), (13.4999975, 8))
            Line((13.4999975, 8), (13.4999975, 5))
            ThreePointArc((13.4999975, 5), (14.525123766, 2.525126266), (16.9999975, 1.5))
            Line((16.9999975, 1.5), (32.9999975, 1.5))
            ThreePointArc((32.9999975, 1.5), (35.474871234, 2.525126266), (36.4999975, 5))
            Line((36.4999975, 5), (36.4999975, 8))
            ThreePointArc((36.4999975, 8), (36.646444109, 8.353553391), (36.9999975, 8.5))
        make_face()
    extrude(amount=-GLASS_FIT_EXTRUDE_DEPTH, mode=Mode.SUBTRACT)


solid = part_2.part
